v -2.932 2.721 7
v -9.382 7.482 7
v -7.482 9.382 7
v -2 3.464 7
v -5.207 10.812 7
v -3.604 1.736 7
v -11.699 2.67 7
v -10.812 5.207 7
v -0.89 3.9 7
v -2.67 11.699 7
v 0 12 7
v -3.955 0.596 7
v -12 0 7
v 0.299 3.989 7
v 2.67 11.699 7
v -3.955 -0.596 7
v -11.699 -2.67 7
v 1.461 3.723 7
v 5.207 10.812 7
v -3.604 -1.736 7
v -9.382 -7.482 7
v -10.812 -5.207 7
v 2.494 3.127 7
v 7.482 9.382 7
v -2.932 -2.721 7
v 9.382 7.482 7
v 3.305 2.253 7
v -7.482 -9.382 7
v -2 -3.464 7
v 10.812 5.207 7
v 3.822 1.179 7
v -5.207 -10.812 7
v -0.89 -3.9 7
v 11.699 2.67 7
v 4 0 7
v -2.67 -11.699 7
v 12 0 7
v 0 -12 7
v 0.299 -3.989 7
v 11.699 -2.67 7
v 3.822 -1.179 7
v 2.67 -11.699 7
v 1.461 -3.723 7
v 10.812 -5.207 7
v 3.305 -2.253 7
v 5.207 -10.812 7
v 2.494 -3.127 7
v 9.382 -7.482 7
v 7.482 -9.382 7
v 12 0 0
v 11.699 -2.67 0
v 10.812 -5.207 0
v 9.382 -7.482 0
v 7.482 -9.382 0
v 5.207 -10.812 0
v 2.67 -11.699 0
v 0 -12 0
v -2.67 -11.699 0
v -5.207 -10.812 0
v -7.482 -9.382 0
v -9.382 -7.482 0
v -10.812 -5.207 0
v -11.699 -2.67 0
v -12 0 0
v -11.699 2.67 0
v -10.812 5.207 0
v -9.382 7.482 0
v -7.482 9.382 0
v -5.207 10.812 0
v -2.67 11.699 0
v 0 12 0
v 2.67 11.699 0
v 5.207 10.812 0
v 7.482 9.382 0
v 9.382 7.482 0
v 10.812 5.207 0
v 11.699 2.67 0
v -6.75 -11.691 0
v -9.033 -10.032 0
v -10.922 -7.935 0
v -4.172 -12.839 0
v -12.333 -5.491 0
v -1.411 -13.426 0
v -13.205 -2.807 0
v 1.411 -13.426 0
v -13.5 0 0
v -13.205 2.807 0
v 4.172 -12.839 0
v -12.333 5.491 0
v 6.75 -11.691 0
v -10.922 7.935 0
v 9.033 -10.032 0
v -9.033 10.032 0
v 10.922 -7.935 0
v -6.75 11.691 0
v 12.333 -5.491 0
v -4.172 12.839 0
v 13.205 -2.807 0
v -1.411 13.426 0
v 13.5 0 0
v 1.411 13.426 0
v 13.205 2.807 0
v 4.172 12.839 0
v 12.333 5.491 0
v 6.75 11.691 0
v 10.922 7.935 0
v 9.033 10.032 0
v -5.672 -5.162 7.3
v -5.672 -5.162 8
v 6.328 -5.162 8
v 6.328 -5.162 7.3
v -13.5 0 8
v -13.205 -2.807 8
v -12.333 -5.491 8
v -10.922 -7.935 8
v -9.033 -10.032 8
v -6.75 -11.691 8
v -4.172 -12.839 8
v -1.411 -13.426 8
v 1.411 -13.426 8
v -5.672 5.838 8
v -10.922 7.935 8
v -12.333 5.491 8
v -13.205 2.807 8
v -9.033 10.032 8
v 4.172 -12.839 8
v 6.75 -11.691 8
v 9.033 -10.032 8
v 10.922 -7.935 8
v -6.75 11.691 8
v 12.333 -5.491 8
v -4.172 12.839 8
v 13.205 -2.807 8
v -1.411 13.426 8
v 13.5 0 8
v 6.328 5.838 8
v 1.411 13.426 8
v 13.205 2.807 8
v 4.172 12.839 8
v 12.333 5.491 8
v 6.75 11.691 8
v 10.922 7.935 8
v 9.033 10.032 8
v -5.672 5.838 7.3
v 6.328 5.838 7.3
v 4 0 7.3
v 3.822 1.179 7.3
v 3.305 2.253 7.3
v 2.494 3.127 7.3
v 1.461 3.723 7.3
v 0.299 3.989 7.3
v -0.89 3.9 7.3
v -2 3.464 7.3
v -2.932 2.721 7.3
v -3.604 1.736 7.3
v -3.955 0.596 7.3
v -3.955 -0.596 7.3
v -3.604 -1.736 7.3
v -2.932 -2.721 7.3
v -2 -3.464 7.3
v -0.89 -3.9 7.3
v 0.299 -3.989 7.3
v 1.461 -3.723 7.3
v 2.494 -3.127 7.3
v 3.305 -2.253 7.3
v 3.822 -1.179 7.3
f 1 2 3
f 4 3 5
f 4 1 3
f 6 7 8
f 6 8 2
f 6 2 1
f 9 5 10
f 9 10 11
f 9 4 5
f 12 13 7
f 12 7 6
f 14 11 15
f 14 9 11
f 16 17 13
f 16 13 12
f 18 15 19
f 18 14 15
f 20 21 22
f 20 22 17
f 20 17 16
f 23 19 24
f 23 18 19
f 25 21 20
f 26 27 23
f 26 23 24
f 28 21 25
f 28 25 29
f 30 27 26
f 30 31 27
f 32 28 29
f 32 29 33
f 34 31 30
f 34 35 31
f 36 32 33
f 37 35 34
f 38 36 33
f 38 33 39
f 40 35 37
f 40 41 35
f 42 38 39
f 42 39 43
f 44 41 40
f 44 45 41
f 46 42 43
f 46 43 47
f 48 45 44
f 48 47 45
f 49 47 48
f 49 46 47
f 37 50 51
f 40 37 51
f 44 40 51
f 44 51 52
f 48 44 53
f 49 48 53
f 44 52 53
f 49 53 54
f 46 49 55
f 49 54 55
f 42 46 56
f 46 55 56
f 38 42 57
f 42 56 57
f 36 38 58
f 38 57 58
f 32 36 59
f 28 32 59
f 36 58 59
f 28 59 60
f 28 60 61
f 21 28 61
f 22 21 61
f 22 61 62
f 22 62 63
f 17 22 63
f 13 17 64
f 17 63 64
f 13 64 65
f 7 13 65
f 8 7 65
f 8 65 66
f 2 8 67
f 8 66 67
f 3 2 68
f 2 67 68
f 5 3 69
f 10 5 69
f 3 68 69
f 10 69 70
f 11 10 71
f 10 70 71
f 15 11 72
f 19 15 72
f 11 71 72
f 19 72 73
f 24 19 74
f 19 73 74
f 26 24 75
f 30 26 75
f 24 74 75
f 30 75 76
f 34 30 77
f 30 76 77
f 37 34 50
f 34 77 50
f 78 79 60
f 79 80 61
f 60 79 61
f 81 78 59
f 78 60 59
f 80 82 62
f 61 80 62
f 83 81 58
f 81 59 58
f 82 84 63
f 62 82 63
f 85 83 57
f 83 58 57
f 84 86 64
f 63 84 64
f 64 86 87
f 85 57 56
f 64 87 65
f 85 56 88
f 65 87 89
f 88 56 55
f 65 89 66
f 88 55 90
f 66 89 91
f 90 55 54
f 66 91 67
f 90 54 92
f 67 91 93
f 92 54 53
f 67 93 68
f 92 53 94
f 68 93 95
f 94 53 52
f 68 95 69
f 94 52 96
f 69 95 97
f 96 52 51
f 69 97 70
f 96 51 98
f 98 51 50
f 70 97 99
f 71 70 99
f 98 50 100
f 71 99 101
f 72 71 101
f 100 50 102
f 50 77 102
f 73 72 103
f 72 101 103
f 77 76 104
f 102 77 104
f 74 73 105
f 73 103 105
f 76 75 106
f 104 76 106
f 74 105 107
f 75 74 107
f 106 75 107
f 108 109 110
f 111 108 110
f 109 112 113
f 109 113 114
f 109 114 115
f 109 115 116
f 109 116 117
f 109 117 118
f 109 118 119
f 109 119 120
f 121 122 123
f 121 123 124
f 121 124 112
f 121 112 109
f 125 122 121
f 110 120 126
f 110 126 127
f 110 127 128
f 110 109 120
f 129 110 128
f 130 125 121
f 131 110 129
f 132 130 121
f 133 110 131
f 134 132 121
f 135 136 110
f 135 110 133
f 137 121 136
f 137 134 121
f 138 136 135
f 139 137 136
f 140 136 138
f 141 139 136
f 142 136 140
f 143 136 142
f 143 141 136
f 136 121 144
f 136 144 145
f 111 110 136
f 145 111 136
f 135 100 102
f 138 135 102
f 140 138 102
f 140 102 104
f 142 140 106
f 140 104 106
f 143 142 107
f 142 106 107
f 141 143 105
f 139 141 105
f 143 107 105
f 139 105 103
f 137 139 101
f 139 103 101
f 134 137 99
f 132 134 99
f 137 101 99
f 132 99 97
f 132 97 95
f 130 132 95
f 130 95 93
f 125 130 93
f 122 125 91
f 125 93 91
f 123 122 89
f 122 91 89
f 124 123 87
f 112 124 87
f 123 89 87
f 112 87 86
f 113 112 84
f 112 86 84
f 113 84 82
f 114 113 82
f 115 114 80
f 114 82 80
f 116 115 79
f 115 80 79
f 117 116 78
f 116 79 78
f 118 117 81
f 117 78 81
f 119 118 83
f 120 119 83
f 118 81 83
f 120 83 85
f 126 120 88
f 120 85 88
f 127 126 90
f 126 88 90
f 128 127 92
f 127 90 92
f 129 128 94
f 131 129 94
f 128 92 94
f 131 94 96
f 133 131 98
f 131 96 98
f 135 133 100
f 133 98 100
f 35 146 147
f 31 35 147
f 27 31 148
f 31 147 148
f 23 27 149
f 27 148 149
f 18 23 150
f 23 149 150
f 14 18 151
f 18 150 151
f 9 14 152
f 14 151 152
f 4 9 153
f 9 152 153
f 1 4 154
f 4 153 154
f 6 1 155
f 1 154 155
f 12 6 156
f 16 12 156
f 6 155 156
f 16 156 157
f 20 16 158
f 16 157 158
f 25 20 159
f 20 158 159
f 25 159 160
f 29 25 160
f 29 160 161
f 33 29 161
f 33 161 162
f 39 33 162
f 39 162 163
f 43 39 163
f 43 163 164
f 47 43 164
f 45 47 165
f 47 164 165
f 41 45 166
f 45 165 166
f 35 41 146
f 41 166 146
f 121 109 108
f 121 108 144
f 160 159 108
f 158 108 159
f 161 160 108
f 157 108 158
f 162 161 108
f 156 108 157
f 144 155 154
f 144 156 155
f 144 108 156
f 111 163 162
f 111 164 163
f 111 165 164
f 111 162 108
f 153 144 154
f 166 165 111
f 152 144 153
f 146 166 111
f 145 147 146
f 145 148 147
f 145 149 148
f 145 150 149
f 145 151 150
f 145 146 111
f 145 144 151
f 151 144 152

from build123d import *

# Parameters (mm, degrees)
F0_R     = 13.5
F1_DEPTH = 8
F2_R     = 12
F3_DEPTH = 7
F4_W     = 12
F4_H     = 11
F5_DEPTH = 0.7
F6_R     = 4
F7_DEPTH = 0.3


with BuildPart() as f1:
    # F0 (on Top) → F1 (new body)
    with BuildSketch(Plane.XY):
        Circle(F0_R)
    extrude(amount=F1_DEPTH)

    # F2 (on face) → F3 (cut)
    with BuildSketch(Plane(origin=(0, 0, 0), x_dir=(1, 0, 0), z_dir=(0, 0, -1))):
        Circle(F2_R)
    extrude(amount=-F3_DEPTH, mode=Mode.SUBTRACT)

    # F4 (on face) → F5 (cut)
    with BuildSketch(Plane.XY.offset(8)):
        with Locations((0.328328, 0.338116)):
            Rectangle(F4_W, F4_H)
    extrude(amount=-F5_DEPTH, mode=Mode.SUBTRACT)

    # F6 (on face) → F7 (cut)
    with BuildSketch(Plane.XY.offset(7.3)):
        Circle(F6_R)
    extrude(amount=-F7_DEPTH, mode=Mode.SUBTRACT)


solid = f1.part
